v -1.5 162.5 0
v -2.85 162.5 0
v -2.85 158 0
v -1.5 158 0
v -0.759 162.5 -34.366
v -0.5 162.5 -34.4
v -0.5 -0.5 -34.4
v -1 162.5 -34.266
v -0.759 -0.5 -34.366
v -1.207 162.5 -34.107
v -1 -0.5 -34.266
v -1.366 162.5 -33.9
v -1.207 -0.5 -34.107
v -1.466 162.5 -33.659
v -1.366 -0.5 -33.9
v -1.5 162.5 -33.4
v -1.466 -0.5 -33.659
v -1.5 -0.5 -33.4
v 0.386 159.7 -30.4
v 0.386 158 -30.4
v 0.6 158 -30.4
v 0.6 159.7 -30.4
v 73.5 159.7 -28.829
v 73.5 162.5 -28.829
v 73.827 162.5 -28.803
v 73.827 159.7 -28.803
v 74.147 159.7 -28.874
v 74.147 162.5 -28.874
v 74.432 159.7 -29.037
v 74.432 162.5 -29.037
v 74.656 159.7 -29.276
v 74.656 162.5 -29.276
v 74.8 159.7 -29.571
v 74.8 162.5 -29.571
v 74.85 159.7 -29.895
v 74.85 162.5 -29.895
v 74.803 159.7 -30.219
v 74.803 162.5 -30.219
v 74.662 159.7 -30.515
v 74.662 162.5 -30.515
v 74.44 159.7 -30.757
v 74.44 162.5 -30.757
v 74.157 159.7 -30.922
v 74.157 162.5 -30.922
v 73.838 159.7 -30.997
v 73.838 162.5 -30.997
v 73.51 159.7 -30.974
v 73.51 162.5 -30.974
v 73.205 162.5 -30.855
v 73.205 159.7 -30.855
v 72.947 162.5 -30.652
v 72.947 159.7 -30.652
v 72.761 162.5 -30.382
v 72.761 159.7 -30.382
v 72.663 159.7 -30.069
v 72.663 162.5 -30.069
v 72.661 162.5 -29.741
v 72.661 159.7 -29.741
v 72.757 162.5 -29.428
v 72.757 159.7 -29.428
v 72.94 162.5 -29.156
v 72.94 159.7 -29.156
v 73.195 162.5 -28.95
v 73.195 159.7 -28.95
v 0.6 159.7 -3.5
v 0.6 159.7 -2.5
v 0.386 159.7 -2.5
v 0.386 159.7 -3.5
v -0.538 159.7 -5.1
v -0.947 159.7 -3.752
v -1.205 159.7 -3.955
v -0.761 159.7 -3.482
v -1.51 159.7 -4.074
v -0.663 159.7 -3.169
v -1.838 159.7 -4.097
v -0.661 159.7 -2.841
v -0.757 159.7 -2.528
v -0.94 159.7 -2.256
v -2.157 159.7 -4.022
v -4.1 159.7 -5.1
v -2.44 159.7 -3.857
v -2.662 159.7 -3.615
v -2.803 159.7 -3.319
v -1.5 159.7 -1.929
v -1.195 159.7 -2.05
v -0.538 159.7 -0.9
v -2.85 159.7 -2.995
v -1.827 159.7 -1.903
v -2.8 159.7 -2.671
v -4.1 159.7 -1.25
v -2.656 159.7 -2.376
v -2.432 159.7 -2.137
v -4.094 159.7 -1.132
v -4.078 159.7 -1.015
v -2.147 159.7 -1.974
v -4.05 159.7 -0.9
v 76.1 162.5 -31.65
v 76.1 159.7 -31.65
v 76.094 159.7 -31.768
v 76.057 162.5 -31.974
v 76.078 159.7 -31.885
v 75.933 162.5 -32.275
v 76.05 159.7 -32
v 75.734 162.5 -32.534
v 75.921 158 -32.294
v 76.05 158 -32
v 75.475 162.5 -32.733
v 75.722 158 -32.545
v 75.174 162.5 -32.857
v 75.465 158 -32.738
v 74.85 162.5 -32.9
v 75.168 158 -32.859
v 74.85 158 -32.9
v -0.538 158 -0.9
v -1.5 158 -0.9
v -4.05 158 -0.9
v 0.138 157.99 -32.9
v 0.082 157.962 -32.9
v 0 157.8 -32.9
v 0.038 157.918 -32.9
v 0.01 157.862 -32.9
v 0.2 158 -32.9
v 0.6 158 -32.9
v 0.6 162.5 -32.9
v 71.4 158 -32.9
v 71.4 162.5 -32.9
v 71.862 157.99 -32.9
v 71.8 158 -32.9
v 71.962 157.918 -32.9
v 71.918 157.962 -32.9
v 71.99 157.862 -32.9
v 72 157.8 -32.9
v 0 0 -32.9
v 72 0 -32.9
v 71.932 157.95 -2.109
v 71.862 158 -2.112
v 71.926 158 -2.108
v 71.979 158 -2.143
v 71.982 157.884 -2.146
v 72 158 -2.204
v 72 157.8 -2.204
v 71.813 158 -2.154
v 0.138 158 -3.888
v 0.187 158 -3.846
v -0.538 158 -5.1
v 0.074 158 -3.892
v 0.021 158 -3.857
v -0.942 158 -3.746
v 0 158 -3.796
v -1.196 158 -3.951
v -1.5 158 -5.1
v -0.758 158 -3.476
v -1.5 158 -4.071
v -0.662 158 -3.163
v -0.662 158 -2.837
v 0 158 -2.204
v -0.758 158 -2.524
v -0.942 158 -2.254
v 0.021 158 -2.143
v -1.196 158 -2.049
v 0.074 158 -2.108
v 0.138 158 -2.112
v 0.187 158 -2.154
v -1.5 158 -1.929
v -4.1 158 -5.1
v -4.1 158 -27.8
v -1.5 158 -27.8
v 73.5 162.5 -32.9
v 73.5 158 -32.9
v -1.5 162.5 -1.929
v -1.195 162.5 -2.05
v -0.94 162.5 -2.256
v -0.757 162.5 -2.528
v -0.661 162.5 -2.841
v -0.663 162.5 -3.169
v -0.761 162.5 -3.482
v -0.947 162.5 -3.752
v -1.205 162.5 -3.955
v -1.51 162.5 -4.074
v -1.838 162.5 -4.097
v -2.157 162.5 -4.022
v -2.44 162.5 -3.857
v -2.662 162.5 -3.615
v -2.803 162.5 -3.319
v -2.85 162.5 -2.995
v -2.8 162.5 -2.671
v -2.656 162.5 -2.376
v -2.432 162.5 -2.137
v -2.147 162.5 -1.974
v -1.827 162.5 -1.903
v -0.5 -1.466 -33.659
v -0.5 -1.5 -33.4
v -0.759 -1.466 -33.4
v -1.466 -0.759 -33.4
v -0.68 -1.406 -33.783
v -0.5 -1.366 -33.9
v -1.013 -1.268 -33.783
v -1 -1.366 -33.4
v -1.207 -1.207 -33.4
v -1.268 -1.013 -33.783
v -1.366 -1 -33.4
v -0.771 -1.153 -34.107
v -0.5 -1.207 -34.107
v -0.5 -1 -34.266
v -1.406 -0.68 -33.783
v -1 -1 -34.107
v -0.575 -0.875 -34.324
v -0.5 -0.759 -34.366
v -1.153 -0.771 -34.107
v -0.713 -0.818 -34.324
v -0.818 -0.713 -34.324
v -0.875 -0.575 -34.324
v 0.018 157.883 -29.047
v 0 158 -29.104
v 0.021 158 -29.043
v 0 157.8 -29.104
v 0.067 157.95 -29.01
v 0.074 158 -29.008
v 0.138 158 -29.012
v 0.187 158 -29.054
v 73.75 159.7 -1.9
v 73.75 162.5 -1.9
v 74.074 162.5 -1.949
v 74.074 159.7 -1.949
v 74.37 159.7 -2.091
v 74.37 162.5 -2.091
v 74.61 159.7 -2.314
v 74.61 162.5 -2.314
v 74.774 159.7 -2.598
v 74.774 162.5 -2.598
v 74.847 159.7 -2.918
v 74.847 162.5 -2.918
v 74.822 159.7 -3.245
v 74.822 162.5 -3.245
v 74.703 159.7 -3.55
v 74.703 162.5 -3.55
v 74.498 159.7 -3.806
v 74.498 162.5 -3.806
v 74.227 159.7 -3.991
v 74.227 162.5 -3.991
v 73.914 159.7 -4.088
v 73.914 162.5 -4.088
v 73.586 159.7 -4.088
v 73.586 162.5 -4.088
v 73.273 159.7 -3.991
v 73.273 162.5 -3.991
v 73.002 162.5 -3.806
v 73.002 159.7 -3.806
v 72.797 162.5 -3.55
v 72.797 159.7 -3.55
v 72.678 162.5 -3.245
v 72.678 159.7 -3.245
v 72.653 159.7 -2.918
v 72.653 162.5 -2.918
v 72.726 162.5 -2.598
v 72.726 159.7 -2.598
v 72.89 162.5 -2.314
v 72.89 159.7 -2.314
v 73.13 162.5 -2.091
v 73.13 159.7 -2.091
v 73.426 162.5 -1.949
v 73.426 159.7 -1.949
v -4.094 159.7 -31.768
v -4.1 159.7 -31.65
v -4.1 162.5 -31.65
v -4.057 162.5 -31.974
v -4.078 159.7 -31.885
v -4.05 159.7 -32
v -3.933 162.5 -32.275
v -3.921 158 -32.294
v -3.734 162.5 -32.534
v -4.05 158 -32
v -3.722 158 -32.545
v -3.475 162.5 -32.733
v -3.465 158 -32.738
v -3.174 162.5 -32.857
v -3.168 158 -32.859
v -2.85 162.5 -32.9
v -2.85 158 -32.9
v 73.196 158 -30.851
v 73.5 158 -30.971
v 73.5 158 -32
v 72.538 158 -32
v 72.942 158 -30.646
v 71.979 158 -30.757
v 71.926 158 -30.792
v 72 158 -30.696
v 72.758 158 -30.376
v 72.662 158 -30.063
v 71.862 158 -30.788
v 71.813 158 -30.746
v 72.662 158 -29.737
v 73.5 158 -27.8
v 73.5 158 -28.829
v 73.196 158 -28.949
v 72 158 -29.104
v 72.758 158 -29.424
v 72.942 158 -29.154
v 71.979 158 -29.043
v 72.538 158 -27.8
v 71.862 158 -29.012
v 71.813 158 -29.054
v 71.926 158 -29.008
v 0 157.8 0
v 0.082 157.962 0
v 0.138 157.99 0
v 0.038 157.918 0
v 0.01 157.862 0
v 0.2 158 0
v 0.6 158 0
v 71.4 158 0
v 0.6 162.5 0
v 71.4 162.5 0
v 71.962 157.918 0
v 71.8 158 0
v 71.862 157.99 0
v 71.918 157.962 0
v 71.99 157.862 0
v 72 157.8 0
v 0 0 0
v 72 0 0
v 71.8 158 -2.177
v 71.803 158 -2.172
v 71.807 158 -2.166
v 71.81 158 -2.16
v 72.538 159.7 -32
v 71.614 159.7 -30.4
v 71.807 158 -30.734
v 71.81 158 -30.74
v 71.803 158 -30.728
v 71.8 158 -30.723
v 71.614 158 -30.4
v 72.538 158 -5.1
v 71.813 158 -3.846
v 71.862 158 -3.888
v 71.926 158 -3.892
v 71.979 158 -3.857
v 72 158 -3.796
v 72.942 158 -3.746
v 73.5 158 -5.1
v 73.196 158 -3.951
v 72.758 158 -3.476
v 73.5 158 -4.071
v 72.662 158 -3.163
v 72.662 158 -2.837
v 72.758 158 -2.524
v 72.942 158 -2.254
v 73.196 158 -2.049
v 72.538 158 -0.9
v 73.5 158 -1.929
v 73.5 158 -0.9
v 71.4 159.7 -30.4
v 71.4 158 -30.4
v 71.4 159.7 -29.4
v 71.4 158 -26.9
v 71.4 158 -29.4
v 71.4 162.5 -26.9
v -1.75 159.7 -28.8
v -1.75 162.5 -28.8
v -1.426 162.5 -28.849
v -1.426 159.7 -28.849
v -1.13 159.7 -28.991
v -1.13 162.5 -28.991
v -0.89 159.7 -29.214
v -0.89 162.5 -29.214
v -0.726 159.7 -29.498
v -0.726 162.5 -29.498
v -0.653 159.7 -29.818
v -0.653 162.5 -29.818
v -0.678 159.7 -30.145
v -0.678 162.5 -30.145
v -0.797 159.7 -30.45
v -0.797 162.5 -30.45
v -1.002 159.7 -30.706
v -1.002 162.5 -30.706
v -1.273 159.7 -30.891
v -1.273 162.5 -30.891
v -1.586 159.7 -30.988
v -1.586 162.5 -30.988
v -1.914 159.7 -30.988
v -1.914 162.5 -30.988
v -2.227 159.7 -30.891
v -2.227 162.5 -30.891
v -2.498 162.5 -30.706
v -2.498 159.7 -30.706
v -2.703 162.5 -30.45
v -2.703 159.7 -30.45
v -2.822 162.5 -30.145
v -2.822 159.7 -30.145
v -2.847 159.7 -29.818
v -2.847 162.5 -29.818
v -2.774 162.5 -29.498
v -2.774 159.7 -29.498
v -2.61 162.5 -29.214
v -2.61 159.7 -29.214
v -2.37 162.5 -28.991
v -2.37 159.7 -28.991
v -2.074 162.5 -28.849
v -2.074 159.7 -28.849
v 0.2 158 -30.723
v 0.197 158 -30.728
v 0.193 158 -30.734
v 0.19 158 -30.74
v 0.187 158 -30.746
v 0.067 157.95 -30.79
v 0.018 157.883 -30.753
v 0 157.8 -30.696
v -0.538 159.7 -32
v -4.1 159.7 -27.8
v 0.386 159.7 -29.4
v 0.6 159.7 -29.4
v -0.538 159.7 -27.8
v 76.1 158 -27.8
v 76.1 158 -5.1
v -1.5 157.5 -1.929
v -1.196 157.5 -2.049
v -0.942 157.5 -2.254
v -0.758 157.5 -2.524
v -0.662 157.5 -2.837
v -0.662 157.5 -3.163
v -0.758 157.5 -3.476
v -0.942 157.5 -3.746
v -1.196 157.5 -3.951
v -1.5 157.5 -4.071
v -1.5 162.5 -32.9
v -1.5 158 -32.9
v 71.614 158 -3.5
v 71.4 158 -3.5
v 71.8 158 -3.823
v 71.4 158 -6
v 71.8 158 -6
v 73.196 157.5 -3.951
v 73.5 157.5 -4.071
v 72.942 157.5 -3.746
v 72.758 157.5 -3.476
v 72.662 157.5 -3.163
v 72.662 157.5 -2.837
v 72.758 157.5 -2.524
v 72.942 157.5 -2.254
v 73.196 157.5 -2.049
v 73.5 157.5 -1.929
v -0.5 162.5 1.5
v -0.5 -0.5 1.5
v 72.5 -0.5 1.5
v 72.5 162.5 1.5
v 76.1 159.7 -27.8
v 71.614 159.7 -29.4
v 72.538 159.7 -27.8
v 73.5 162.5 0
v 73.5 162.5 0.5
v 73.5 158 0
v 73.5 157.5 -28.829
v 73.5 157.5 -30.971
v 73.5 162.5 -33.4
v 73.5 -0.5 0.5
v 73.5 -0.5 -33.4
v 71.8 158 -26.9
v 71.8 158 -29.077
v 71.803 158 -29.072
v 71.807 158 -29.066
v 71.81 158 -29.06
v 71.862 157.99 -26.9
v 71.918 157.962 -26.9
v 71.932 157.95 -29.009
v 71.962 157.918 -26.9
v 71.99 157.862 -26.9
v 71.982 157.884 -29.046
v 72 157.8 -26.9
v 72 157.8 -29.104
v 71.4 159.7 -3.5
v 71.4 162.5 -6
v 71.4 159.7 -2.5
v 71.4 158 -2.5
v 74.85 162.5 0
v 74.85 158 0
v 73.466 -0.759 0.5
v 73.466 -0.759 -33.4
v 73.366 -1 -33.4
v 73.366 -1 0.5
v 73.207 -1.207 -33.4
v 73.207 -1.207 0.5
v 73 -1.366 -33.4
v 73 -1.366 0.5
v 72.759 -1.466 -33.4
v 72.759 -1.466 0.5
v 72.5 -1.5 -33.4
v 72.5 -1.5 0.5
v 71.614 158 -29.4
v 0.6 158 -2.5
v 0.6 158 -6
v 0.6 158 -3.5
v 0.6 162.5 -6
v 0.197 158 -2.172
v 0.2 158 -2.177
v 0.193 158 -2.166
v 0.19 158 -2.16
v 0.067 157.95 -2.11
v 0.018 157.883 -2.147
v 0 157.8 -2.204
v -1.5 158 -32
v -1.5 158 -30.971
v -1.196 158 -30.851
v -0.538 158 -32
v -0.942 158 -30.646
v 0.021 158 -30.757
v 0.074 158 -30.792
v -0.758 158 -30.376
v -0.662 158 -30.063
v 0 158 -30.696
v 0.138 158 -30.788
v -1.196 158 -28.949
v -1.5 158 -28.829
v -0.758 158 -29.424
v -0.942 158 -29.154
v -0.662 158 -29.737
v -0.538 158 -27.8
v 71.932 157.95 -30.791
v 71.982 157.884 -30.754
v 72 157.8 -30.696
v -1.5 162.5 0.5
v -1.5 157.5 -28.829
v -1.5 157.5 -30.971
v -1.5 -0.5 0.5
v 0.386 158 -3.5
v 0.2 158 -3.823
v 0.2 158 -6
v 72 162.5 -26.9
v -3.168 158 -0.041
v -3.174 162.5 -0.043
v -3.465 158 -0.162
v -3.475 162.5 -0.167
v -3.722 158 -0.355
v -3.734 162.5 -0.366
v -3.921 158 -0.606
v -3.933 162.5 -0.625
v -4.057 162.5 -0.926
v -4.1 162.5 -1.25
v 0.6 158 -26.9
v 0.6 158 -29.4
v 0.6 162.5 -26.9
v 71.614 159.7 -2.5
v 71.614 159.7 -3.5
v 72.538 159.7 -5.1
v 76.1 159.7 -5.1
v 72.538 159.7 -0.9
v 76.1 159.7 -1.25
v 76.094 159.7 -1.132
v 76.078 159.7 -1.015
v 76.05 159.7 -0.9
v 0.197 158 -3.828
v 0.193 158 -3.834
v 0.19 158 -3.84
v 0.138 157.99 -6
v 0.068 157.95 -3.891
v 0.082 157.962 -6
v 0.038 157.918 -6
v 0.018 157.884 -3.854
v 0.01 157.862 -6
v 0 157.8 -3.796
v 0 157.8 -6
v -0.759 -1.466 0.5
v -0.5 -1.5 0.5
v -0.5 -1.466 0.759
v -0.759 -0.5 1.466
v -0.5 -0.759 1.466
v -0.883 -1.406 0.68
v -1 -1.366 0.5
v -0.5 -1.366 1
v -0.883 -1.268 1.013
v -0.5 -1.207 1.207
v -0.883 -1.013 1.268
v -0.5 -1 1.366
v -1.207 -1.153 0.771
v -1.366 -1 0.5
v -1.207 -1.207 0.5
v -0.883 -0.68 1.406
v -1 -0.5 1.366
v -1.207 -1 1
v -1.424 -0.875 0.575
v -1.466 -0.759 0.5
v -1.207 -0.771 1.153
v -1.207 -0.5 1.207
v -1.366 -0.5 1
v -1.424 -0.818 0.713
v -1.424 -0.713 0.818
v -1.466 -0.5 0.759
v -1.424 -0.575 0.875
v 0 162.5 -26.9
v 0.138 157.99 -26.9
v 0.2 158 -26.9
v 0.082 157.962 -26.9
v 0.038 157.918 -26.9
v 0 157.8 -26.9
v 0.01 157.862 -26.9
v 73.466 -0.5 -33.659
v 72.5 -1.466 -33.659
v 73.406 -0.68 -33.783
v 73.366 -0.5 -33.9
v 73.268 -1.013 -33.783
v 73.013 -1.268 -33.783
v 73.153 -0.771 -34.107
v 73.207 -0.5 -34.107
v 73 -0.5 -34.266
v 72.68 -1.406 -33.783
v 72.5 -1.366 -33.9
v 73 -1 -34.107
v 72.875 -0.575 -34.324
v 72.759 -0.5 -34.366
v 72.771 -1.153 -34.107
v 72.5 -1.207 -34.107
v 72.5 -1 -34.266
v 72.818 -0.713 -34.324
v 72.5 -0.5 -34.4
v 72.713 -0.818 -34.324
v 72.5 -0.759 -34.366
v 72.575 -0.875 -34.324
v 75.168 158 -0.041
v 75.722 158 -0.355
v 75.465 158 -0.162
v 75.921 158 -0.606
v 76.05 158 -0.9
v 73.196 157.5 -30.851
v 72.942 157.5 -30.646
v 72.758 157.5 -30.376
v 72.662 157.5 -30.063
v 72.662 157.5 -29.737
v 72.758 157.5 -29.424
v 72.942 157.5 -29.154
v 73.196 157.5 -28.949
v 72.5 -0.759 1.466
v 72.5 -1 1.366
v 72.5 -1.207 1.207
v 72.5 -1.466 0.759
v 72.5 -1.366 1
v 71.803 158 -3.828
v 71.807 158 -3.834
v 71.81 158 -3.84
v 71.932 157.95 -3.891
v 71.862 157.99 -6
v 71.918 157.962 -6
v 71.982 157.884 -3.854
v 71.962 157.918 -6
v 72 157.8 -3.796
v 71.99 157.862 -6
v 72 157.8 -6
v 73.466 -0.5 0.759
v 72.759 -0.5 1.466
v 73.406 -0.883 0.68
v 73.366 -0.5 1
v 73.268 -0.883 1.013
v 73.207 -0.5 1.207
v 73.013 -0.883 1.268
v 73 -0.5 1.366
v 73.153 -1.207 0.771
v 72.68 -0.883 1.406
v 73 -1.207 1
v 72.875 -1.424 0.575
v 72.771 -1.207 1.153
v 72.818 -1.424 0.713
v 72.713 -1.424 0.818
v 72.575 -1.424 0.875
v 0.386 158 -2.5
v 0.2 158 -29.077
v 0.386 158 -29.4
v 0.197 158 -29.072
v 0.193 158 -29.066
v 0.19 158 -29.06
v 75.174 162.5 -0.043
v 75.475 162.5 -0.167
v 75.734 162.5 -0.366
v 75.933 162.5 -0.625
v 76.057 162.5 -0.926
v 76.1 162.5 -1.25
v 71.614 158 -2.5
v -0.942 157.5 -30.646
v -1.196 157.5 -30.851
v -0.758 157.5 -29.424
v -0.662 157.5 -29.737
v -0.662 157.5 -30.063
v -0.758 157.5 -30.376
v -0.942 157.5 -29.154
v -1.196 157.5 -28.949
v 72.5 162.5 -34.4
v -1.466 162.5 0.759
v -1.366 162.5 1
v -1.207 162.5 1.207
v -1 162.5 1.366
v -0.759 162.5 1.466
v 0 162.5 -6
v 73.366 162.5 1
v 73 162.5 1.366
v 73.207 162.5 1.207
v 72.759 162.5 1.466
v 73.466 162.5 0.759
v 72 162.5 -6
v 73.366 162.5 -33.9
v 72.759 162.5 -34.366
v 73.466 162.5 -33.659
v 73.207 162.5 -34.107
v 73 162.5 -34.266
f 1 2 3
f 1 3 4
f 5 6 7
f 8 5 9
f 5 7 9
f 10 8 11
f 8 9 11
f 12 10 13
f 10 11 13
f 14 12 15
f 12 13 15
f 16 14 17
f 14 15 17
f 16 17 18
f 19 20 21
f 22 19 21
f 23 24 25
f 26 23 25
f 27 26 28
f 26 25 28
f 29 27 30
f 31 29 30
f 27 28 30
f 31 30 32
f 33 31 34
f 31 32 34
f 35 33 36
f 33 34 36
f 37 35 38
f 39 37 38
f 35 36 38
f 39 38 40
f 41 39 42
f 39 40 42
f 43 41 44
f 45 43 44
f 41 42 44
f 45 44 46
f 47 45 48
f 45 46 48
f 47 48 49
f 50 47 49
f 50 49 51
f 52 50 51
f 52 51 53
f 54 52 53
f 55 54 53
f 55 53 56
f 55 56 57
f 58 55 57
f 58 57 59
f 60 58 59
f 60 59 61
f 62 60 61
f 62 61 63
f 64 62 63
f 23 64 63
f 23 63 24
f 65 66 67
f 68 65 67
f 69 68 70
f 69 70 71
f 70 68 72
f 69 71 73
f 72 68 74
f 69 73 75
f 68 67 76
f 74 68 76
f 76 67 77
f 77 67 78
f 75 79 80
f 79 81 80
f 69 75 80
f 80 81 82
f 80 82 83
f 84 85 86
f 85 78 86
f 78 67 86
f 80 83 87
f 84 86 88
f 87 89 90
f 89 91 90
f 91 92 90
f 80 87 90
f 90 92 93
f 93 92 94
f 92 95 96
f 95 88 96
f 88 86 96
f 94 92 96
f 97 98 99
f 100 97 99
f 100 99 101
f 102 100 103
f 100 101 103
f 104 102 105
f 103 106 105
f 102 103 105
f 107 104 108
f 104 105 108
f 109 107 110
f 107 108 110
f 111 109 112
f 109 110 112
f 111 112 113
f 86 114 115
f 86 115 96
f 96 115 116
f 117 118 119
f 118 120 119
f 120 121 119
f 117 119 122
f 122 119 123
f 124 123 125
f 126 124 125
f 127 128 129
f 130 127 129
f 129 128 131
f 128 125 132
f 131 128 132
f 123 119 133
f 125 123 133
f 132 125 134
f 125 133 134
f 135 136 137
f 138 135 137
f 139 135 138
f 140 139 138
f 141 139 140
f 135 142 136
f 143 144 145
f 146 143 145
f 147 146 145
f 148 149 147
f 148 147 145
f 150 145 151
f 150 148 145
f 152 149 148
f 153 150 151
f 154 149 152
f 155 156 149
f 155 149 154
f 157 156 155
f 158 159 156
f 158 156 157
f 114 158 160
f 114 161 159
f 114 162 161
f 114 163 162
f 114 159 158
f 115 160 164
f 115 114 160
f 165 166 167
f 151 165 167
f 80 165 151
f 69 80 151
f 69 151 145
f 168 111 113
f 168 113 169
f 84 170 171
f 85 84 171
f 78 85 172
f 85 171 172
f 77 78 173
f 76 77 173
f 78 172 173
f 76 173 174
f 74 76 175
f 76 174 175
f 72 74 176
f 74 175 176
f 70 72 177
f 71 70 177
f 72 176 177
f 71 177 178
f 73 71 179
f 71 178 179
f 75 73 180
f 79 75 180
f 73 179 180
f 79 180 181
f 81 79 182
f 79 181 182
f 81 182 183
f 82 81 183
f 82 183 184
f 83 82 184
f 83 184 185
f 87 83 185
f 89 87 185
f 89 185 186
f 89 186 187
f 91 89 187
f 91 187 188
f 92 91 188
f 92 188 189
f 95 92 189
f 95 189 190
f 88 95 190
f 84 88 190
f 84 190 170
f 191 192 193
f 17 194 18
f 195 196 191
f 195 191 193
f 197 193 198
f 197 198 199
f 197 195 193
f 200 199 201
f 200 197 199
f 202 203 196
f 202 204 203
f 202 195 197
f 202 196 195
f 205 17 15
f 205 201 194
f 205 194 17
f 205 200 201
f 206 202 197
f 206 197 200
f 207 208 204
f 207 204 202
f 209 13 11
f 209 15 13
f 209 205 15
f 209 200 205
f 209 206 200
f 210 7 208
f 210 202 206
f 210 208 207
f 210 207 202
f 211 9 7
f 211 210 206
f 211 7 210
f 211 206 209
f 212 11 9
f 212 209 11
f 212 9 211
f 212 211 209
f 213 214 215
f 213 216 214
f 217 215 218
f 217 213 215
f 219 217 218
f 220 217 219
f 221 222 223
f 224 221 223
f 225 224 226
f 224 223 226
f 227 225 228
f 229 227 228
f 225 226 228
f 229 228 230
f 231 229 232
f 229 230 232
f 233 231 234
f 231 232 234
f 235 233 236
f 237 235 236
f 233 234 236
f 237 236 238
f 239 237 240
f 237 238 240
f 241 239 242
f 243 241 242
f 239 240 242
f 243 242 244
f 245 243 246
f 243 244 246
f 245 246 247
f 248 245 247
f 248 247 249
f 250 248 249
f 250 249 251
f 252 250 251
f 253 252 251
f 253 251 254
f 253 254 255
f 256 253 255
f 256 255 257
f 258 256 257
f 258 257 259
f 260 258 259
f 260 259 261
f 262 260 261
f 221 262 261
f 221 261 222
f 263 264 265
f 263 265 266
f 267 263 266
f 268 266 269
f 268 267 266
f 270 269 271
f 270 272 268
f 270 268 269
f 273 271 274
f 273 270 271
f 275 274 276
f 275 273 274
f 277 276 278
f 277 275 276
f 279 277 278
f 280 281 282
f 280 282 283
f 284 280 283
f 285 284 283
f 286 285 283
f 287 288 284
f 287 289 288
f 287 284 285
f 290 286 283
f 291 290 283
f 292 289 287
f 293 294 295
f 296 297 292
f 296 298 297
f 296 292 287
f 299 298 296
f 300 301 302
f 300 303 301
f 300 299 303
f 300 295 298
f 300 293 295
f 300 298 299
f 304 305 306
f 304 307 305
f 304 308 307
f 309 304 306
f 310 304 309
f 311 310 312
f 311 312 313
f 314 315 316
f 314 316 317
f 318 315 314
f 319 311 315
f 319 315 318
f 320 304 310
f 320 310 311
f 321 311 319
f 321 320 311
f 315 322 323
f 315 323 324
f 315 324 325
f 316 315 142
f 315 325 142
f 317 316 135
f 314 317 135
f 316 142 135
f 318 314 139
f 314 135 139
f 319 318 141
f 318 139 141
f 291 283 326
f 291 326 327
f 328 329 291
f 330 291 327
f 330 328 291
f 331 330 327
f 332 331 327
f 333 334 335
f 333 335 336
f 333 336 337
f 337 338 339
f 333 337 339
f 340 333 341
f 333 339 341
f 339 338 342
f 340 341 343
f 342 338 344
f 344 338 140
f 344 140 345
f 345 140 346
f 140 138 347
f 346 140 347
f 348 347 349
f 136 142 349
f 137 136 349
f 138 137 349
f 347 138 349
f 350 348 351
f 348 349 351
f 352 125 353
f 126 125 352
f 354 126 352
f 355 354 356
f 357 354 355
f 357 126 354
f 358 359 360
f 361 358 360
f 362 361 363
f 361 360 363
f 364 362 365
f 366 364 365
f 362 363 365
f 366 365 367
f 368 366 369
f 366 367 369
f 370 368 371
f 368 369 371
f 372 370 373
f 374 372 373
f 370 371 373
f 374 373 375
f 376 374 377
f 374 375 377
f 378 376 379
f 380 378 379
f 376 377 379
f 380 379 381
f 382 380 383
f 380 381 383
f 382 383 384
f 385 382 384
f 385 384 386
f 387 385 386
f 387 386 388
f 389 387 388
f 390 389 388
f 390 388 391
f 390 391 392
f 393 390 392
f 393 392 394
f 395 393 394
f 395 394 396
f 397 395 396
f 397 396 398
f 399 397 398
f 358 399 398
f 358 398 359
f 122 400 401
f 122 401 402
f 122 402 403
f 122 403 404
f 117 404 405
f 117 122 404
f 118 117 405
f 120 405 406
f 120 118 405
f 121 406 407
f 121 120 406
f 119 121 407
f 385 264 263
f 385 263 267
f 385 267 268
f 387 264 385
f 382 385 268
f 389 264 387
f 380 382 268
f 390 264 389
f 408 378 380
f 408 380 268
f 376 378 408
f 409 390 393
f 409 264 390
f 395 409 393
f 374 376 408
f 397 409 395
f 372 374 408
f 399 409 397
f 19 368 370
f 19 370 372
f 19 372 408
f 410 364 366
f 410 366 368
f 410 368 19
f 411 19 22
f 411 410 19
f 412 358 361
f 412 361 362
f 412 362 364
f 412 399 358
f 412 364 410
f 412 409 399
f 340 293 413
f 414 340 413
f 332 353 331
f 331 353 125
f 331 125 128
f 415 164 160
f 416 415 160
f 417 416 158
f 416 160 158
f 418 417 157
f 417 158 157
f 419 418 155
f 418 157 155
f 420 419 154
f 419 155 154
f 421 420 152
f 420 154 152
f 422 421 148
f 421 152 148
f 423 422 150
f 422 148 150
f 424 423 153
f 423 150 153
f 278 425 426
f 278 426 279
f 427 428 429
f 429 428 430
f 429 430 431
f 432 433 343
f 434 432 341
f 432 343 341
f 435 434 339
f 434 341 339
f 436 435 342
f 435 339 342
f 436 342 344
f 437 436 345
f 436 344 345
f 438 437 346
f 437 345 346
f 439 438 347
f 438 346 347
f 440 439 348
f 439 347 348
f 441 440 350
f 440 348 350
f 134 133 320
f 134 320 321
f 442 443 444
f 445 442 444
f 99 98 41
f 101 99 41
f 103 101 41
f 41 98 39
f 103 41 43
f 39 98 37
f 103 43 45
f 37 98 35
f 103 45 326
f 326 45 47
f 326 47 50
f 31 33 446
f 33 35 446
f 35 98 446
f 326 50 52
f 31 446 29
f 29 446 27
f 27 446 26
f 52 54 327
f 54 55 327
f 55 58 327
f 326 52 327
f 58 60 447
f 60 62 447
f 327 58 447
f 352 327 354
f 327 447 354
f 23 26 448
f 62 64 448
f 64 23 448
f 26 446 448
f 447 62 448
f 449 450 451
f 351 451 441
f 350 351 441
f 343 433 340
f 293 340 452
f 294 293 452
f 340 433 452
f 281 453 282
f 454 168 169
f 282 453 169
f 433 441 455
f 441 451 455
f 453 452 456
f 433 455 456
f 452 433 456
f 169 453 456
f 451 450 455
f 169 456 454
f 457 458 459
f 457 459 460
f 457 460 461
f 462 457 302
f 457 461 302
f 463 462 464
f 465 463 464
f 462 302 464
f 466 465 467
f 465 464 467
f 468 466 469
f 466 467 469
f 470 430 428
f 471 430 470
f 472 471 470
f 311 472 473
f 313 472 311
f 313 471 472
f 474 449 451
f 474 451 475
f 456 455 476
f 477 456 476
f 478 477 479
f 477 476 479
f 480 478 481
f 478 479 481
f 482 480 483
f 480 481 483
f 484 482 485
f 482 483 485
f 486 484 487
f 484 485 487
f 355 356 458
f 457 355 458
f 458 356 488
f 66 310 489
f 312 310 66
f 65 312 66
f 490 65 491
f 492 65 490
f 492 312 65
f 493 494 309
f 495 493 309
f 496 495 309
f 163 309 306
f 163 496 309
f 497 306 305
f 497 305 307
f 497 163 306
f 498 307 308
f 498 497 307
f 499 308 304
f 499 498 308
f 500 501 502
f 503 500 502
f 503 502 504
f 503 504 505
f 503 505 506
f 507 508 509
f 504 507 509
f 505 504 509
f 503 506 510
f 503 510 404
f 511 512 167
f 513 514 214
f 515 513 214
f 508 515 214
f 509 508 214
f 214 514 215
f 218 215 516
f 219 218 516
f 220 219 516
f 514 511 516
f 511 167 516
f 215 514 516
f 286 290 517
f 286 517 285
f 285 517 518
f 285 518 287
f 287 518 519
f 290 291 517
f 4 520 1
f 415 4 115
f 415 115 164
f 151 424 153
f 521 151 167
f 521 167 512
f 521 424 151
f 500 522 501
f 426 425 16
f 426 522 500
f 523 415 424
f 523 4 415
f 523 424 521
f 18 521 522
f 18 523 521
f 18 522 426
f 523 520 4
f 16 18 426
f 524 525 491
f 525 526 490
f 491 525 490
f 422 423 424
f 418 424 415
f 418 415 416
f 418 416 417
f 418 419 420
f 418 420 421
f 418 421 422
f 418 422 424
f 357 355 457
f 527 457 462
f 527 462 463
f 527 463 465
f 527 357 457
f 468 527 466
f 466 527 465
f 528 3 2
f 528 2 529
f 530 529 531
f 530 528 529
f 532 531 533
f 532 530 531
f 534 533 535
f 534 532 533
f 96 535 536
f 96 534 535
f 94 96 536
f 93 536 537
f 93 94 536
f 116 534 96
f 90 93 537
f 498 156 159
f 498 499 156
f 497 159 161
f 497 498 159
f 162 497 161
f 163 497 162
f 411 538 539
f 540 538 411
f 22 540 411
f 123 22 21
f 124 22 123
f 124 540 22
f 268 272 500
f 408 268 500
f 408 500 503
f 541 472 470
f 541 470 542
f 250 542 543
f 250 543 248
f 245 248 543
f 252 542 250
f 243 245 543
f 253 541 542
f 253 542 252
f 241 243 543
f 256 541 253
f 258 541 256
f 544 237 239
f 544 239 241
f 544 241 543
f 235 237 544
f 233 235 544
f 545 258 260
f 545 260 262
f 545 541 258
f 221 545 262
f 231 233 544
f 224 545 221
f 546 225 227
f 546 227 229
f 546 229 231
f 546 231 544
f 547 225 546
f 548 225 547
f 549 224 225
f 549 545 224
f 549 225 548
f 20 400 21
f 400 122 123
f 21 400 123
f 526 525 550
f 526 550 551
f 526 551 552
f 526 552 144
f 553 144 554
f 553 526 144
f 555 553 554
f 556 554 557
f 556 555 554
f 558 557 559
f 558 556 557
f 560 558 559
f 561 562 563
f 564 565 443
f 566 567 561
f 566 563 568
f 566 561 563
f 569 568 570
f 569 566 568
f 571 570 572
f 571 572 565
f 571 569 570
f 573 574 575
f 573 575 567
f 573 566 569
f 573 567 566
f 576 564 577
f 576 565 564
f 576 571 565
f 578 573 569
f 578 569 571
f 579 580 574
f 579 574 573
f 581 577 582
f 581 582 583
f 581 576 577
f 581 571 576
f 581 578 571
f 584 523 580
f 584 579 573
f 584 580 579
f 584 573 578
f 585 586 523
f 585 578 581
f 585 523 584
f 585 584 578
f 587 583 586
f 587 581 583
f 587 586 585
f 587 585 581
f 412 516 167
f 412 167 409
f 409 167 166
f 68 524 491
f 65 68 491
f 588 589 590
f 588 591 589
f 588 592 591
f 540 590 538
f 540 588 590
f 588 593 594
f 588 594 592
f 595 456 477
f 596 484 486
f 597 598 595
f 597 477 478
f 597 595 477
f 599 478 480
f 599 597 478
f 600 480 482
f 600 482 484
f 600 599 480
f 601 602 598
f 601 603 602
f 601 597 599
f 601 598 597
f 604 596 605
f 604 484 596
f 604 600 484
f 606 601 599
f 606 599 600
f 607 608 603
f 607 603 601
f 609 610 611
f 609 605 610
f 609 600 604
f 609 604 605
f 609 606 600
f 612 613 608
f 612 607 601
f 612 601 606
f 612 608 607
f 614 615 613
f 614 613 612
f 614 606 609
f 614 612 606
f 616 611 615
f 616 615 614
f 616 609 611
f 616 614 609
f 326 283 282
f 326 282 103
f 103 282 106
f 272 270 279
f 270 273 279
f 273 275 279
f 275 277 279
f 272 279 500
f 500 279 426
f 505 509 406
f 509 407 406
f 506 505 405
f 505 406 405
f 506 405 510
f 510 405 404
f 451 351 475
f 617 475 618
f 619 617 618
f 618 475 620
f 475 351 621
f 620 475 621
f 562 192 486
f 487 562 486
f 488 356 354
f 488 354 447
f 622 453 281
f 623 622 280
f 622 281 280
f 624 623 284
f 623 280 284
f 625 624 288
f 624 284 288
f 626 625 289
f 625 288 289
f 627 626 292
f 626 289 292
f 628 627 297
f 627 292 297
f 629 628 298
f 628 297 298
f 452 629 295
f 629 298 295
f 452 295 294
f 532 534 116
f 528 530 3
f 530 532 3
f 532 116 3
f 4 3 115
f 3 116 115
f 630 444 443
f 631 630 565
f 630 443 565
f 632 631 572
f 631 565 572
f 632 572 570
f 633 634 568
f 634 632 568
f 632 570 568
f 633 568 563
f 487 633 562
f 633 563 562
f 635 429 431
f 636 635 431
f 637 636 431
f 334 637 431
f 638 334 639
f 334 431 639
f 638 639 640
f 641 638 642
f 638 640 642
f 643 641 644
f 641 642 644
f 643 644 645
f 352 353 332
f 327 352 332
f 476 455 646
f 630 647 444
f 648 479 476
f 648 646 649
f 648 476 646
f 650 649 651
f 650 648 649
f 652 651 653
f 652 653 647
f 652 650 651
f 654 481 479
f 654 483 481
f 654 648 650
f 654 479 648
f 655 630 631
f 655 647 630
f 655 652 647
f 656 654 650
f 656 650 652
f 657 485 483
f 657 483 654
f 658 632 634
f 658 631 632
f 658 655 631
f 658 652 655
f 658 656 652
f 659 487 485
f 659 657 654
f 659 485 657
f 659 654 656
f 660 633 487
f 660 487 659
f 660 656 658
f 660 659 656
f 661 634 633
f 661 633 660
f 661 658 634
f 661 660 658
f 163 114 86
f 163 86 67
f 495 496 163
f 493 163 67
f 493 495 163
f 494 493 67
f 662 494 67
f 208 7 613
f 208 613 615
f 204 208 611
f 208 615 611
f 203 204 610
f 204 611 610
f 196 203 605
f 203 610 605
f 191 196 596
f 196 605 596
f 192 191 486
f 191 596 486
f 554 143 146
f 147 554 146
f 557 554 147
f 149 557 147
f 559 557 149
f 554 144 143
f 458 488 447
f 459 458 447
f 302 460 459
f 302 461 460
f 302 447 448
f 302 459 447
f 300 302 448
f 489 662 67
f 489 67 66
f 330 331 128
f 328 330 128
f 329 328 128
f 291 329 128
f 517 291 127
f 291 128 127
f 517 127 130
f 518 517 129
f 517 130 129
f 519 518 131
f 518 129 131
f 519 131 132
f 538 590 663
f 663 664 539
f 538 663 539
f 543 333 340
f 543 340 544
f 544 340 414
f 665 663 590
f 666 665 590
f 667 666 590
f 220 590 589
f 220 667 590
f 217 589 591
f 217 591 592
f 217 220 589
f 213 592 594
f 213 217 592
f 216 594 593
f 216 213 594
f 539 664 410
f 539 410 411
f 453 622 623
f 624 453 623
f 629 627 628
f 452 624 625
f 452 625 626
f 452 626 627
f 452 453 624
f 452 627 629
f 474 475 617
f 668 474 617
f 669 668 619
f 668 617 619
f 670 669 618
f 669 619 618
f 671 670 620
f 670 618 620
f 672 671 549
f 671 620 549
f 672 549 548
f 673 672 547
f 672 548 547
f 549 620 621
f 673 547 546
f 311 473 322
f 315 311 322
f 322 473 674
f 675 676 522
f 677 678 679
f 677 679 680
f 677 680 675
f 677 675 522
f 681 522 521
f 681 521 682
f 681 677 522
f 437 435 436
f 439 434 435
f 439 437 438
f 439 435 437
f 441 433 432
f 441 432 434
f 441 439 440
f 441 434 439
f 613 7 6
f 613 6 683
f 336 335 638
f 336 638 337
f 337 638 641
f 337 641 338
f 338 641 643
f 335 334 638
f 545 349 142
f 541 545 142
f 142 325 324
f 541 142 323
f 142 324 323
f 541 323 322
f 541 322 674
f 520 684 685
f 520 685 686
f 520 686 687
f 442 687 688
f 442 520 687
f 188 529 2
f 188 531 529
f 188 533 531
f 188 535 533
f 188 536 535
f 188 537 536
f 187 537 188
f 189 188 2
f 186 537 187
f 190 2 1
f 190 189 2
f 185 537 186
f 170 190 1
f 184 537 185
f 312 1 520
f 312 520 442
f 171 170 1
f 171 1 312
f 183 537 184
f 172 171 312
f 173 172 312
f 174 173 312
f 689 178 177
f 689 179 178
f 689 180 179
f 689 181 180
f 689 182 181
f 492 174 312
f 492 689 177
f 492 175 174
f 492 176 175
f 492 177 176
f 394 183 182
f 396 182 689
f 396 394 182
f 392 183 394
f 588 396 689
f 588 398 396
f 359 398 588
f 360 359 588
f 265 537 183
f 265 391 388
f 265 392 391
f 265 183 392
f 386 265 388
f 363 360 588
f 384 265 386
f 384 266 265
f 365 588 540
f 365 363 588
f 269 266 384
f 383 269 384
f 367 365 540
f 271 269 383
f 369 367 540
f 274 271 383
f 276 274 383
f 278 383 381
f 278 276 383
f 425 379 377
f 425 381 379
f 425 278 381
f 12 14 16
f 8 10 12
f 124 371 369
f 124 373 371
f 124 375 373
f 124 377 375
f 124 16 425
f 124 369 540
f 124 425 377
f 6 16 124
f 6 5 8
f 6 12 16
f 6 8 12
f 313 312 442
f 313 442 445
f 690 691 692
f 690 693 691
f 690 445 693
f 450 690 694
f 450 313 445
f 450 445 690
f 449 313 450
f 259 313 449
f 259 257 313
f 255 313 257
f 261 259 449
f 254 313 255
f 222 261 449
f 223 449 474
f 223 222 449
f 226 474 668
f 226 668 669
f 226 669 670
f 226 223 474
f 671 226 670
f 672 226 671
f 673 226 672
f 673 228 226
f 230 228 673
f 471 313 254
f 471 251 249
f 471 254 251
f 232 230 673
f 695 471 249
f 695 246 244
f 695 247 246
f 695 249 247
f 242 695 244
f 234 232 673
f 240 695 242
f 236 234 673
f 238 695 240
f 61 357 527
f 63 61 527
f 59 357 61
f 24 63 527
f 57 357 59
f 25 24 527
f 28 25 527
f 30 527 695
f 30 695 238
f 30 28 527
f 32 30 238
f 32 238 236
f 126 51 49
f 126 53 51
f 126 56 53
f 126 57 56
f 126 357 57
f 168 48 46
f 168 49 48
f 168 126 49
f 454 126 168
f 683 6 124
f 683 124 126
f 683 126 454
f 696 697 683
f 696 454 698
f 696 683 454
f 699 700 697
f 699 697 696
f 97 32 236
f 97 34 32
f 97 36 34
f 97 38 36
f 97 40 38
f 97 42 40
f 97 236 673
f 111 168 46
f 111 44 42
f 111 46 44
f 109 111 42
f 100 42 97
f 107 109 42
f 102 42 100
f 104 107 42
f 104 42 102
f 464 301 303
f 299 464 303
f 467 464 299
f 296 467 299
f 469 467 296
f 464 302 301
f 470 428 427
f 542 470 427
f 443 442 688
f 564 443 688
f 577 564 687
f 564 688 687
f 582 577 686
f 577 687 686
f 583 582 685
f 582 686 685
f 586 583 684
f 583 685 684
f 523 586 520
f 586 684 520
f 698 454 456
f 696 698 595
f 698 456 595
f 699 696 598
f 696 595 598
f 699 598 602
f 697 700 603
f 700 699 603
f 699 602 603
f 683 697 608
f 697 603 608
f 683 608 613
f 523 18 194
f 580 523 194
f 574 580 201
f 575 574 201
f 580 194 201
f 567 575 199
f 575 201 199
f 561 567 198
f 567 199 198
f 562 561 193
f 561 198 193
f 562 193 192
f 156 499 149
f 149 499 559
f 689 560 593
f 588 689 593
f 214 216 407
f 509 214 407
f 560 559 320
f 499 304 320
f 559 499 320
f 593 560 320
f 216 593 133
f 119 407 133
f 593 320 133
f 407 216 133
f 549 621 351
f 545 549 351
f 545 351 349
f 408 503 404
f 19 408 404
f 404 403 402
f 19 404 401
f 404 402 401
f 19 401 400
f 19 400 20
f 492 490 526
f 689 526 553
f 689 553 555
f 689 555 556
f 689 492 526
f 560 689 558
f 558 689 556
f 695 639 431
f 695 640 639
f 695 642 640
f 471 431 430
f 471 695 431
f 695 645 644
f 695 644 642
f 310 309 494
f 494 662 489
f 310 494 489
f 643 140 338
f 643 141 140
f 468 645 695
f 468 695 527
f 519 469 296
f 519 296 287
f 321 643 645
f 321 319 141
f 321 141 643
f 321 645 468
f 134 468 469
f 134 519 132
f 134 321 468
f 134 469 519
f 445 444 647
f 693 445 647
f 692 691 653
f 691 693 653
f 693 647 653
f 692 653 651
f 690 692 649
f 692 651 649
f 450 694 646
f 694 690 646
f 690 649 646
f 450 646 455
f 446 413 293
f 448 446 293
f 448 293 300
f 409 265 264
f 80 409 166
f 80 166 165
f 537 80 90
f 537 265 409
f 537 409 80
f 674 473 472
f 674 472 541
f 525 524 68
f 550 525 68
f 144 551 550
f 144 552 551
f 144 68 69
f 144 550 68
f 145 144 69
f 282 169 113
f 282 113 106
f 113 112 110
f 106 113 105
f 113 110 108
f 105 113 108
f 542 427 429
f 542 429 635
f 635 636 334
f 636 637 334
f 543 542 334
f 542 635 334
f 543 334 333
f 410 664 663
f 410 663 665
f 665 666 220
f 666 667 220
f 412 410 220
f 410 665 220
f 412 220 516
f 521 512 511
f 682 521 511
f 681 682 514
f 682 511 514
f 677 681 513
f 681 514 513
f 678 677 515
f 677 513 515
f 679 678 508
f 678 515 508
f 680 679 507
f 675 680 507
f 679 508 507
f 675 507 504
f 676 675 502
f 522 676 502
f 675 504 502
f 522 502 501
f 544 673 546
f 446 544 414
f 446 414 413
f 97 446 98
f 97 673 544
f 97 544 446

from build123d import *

# Parameters (mm, degrees)
SKETCH_1_W          = 72
SKETCH_1_H          = 32.9
EXTRUDE_1_DEPTH     = 162.5
SHELL_1_T           = 1.5
FILLET_2_R          = 1
EXTRUDE_2_DEPTH     = 4.5
SKETCH_8_R          = 1.1
CUT_EXTRUDE_3_DEPTH = 5
CUT_EXTRUDE_4_DEPTH = 1.7
FILLET_3_R          = 1.25
SKETCH_11_W         = 0.5
SKETCH_11_H         = 1
CUT_EXTRUDE_5_DEPTH = 1.7
FILLET_4_R          = 0.2
FILLET_5_R          = 0.1


with BuildPart() as part:
    # 草图1 → 凸台-拉伸1 (new body)
    with BuildSketch(Plane(origin=(0, 0, 0), x_dir=(1, 0, 0), z_dir=(0, 1, 0))):
        with Locations((36, 16.45)):
            Rectangle(SKETCH_1_W, SKETCH_1_H)
    extrude(amount=EXTRUDE_1_DEPTH)

    # 抽壳1
    shell_1_openings = [part.faces().sort_by_distance(p)[0] for p in [
        (36, 162.5, -16.45),
    ]]
    offset(amount=SHELL_1_T, openings=shell_1_openings, kind=Kind.INTERSECTION)

    # 圆角2
    # the kernel refuses this fillet: 1 mm, written as the material it takes off along each edge
    with BuildSketch(Plane(origin=(72.5, -0.5, -33.4), x_dir=(0, -1, 0), z_dir=(0, 0, -1))) as fillet_2_piece_1_section:
        Polygon((0, 0), (FILLET_2_R, 0), (FILLET_2_R, -FILLET_2_R), (0, -FILLET_2_R), align=None)
    fillet_2_piece_1 = extrude(amount=FILLET_2_R, mode=Mode.PRIVATE)
    fillet_2_piece_1 = fillet_2_piece_1 - Plane(origin=(72.5, -0.5, -33.4), x_dir=(-0.7071067811865475, 0.7071067811865475, 0), z_dir=(0, 0, -1)) * Sphere(FILLET_2_R, mode=Mode.PRIVATE)
    add(fillet_2_piece_1, mode=Mode.SUBTRACT)
    with BuildSketch(Plane(origin=(-0.5, -0.5, -33.4), x_dir=(-1, 0, 0), z_dir=(0, 0, -1))) as fillet_2_piece_2_section:
        Polygon((0, 0), (FILLET_2_R, 0), (FILLET_2_R, -FILLET_2_R), (0, -FILLET_2_R), align=None)
    fillet_2_piece_2 = extrude(amount=FILLET_2_R, mode=Mode.PRIVATE)
    fillet_2_piece_2 = fillet_2_piece_2 - Plane(origin=(-0.5, -0.5, -33.4), x_dir=(0.7071067811865475, 0.7071067811865475, 0), z_dir=(0, 0, -1)) * Sphere(FILLET_2_R, mode=Mode.PRIVATE)
    add(fillet_2_piece_2, mode=Mode.SUBTRACT)
    with BuildSketch(Plane(origin=(72.5, -0.5, 0.5), x_dir=(0, 0, 1), z_dir=(0, -1, 0))) as fillet_2_piece_3_section:
        Polygon((0, 0), (FILLET_2_R, 0), (FILLET_2_R, -FILLET_2_R), (0, -FILLET_2_R), align=None)
    fillet_2_piece_3 = extrude(amount=FILLET_2_R, mode=Mode.PRIVATE)
    fillet_2_piece_3 = fillet_2_piece_3 - Plane(origin=(72.5, -0.5, 0.5), x_dir=(-0.7071067811865475, 0, -0.7071067811865475), z_dir=(0, -1, 0)) * Sphere(FILLET_2_R, mode=Mode.PRIVATE)
    add(fillet_2_piece_3, mode=Mode.SUBTRACT)
    with BuildSketch(Plane(origin=(-0.5, -0.5, 0.5), x_dir=(0, -1, 0), z_dir=(-1, 0, 0))) as fillet_2_piece_4_section:
        Polygon((0, 0), (FILLET_2_R, 0), (FILLET_2_R, FILLET_2_R), (0, FILLET_2_R), align=None)
    fillet_2_piece_4 = extrude(amount=FILLET_2_R, mode=Mode.PRIVATE)
    fillet_2_piece_4 = fillet_2_piece_4 - Plane(origin=(-0.5, -0.5, 0.5), x_dir=(0, 0.7071067811865475, -0.7071067811865475), z_dir=(-1, 0, 0)) * Sphere(FILLET_2_R, mode=Mode.PRIVATE)
    add(fillet_2_piece_4, mode=Mode.SUBTRACT)
    with BuildSketch(Plane(origin=(72.5, -1.5, -34.4), x_dir=(0, 1, 0), z_dir=(-1, 0, 0)), Plane(origin=(-0.5, -1.5, 1.5), x_dir=(0, 1, 0), z_dir=(1, 0, 0))) as fillet_2_piece_5:
        with BuildLine():
            CenterArc((FILLET_2_R, -FILLET_2_R), FILLET_2_R, 90, 90)
            Line((0, -FILLET_2_R), (0, 0))
            Line((0, 0), (FILLET_2_R, 0))
        make_face()
    extrude(amount=73, mode=Mode.SUBTRACT)
    with BuildSketch(Plane(origin=(73.5, -1.5, 0.5), x_dir=(0, 1, 0), z_dir=(0, 0, -1)), Plane(origin=(-1.5, -1.5, -33.4), x_dir=(0, 1, 0), z_dir=(0, 0, 1))) as fillet_2_piece_6:
        with BuildLine():
            CenterArc((FILLET_2_R, -FILLET_2_R), FILLET_2_R, 90, 90)
            Line((0, -FILLET_2_R), (0, 0))
            Line((0, 0), (FILLET_2_R, 0))
        make_face()
    extrude(amount=33.9, mode=Mode.SUBTRACT)
    with BuildSketch(Plane(origin=(-1.5, -0.5, -34.4), x_dir=(1, 0, 0), z_dir=(0, 1, 0)), Plane(origin=(73.5, -0.5, -34.4), x_dir=(0, 0, 1), z_dir=(0, 1, 0)), Plane(origin=(73.5, -0.5, 1.5), x_dir=(-1, 0, 0), z_dir=(0, 1, 0)), Plane(origin=(-1.5, 165, 1.5), x_dir=(1, 0, 0), z_dir=(0, -1, 0))) as fillet_2_piece_7:
        with BuildLine():
            CenterArc((FILLET_2_R, -FILLET_2_R), FILLET_2_R, 90, 90)
            Line((0, -FILLET_2_R), (0, 0))
            Line((0, 0), (FILLET_2_R, 0))
        make_face()
    extrude(amount=165.5, mode=Mode.SUBTRACT)

    # 草图2 → 凸台-拉伸2 (add)
    with BuildSketch(Plane(origin=(0, 162.5, 0), x_dir=(1, 0, 0), z_dir=(0, 1, 0))):
        Polygon((-1.5, 6), (-1.5, 26.9), (0.6, 26.9), (0.6, 32.9), (-4.1, 32.9), (-4.1, 26.9), (-4.1, 6), (-4.1, 0), (0.6, 0), (0.6, 6), align=None)
        Polygon((73.5, 26.9), (73.5, 6), (71.4, 6), (71.4, 0), (76.1, 0), (76.1, 6), (76.1, 26.9), (76.1, 32.9), (71.4, 32.9), (71.4, 26.9), align=None)
    extrude(amount=-EXTRUDE_2_DEPTH)

    # 草图8 → 切除-拉伸3 (cut)
    with BuildSketch(Plane(origin=(0, 162.5, 0), x_dir=(1, 0, 0), z_dir=(0, 1, 0))):
        with Locations(Location((-1.75, 29.9, 0), (0, 0, 270))):
            Circle(SKETCH_8_R)
        with Locations(Location((73.75, 29.9, 0), (0, 0, 256.863441213))):
            Circle(SKETCH_8_R)
        with Locations(Location((73.75, 3, 0), (0, 0, 270))):
            Circle(SKETCH_8_R)
        with Locations(Location((-1.75, 3, 0), (0, 0, 283.136558787))):
            Circle(SKETCH_8_R)
    extrude(amount=-CUT_EXTRUDE_3_DEPTH, mode=Mode.SUBTRACT)

    # 草图10 → 切除-拉伸4 (cut)
    with BuildSketch(Plane.XZ.offset(-158)):
        Polygon((-2.360902354, -27.8), (-4.325128869, -27.8), (-4.325128869, -32), (-2.477398874, -32), (-0.537564435, -32), (0.674871131, -29.9), (-0.537564435, -27.8), align=None)
        Polygon((76.325128869, -27.8), (76.325128869, -32), (74.477398874, -32), (72.537564435, -32), (71.325128869, -29.9), (72.537564435, -27.8), (74.360902354, -27.8), align=None)
        Polygon((-4.325128869, -5.1), (-4.325128869, -0.9), (-2.477398874, -0.9), (-0.537564435, -0.9), (0.674871131, -3), (-0.537564435, -5.1), (-2.360902354, -5.1), align=None)
        Polygon((74.360902354, -5.1), (76.325128869, -5.1), (76.325128869, -0.9), (74.477398874, -0.9), (72.537564435, -0.9), (71.325128869, -3), (72.537564435, -5.1), align=None)
    extrude(amount=-CUT_EXTRUDE_4_DEPTH, mode=Mode.SUBTRACT)

    # 圆角3
    fillet_3_edges = [part.edges().sort_by_distance(p)[0] for p in [
        (76.1, 160.25, -32.9),
        (76.1, 160.25, 0),
        (-4.1, 160.25, 0),
        (-4.1, 160.25, -32.9),
    ]]
    fillet(fillet_3_edges, radius=FILLET_3_R)

    # 草图11 → 切除-拉伸5 (cut)
    with BuildSketch(Plane.XZ.offset(-158)):
        with Locations((0.55, -3)):
            Rectangle(SKETCH_11_W, SKETCH_11_H)
        with Locations((71.45, -3)):
            Rectangle(SKETCH_11_W, SKETCH_11_H)
        with Locations((71.45, -29.9)):
            Rectangle(SKETCH_11_W, SKETCH_11_H)
        with Locations((0.55, -29.9)):
            Rectangle(SKETCH_11_W, SKETCH_11_H)
    extrude(amount=-CUT_EXTRUDE_5_DEPTH, mode=Mode.SUBTRACT)

    # 圆角4
    fillet_4_edges = [part.edges().sort_by_distance(p)[0] for p in [
        (72, 158, -31.984455543),
        (72, 158, -5.084455543),
        (72, 158, -0.915544457),
        (72, 158, -27.815544457),
        (0, 158, -0.915544457),
        (0, 158, -27.815544457),
        (0, 158, -31.984455543),
        (0, 158, -5.084455543),
    ]]
    fillet(fillet_4_edges, radius=FILLET_4_R)

    # 圆角5
    fillet_5_edges = [part.edges().sort_by_distance(p)[0] for p in [
        (0, 157.9, -28.731088913),
        (0, 157.9, -31.068911087),
        (0, 157.9, -4.168911087),
        (0, 157.9, -1.831088913),
        (72, 157.9, -4.168911087),
        (72, 157.9, -1.831088913),
        (72, 157.9, -28.731088913),
        (72, 157.9, -31.068911087),
    ]]
    fillet(fillet_5_edges, radius=FILLET_5_R)


solid = part.part
